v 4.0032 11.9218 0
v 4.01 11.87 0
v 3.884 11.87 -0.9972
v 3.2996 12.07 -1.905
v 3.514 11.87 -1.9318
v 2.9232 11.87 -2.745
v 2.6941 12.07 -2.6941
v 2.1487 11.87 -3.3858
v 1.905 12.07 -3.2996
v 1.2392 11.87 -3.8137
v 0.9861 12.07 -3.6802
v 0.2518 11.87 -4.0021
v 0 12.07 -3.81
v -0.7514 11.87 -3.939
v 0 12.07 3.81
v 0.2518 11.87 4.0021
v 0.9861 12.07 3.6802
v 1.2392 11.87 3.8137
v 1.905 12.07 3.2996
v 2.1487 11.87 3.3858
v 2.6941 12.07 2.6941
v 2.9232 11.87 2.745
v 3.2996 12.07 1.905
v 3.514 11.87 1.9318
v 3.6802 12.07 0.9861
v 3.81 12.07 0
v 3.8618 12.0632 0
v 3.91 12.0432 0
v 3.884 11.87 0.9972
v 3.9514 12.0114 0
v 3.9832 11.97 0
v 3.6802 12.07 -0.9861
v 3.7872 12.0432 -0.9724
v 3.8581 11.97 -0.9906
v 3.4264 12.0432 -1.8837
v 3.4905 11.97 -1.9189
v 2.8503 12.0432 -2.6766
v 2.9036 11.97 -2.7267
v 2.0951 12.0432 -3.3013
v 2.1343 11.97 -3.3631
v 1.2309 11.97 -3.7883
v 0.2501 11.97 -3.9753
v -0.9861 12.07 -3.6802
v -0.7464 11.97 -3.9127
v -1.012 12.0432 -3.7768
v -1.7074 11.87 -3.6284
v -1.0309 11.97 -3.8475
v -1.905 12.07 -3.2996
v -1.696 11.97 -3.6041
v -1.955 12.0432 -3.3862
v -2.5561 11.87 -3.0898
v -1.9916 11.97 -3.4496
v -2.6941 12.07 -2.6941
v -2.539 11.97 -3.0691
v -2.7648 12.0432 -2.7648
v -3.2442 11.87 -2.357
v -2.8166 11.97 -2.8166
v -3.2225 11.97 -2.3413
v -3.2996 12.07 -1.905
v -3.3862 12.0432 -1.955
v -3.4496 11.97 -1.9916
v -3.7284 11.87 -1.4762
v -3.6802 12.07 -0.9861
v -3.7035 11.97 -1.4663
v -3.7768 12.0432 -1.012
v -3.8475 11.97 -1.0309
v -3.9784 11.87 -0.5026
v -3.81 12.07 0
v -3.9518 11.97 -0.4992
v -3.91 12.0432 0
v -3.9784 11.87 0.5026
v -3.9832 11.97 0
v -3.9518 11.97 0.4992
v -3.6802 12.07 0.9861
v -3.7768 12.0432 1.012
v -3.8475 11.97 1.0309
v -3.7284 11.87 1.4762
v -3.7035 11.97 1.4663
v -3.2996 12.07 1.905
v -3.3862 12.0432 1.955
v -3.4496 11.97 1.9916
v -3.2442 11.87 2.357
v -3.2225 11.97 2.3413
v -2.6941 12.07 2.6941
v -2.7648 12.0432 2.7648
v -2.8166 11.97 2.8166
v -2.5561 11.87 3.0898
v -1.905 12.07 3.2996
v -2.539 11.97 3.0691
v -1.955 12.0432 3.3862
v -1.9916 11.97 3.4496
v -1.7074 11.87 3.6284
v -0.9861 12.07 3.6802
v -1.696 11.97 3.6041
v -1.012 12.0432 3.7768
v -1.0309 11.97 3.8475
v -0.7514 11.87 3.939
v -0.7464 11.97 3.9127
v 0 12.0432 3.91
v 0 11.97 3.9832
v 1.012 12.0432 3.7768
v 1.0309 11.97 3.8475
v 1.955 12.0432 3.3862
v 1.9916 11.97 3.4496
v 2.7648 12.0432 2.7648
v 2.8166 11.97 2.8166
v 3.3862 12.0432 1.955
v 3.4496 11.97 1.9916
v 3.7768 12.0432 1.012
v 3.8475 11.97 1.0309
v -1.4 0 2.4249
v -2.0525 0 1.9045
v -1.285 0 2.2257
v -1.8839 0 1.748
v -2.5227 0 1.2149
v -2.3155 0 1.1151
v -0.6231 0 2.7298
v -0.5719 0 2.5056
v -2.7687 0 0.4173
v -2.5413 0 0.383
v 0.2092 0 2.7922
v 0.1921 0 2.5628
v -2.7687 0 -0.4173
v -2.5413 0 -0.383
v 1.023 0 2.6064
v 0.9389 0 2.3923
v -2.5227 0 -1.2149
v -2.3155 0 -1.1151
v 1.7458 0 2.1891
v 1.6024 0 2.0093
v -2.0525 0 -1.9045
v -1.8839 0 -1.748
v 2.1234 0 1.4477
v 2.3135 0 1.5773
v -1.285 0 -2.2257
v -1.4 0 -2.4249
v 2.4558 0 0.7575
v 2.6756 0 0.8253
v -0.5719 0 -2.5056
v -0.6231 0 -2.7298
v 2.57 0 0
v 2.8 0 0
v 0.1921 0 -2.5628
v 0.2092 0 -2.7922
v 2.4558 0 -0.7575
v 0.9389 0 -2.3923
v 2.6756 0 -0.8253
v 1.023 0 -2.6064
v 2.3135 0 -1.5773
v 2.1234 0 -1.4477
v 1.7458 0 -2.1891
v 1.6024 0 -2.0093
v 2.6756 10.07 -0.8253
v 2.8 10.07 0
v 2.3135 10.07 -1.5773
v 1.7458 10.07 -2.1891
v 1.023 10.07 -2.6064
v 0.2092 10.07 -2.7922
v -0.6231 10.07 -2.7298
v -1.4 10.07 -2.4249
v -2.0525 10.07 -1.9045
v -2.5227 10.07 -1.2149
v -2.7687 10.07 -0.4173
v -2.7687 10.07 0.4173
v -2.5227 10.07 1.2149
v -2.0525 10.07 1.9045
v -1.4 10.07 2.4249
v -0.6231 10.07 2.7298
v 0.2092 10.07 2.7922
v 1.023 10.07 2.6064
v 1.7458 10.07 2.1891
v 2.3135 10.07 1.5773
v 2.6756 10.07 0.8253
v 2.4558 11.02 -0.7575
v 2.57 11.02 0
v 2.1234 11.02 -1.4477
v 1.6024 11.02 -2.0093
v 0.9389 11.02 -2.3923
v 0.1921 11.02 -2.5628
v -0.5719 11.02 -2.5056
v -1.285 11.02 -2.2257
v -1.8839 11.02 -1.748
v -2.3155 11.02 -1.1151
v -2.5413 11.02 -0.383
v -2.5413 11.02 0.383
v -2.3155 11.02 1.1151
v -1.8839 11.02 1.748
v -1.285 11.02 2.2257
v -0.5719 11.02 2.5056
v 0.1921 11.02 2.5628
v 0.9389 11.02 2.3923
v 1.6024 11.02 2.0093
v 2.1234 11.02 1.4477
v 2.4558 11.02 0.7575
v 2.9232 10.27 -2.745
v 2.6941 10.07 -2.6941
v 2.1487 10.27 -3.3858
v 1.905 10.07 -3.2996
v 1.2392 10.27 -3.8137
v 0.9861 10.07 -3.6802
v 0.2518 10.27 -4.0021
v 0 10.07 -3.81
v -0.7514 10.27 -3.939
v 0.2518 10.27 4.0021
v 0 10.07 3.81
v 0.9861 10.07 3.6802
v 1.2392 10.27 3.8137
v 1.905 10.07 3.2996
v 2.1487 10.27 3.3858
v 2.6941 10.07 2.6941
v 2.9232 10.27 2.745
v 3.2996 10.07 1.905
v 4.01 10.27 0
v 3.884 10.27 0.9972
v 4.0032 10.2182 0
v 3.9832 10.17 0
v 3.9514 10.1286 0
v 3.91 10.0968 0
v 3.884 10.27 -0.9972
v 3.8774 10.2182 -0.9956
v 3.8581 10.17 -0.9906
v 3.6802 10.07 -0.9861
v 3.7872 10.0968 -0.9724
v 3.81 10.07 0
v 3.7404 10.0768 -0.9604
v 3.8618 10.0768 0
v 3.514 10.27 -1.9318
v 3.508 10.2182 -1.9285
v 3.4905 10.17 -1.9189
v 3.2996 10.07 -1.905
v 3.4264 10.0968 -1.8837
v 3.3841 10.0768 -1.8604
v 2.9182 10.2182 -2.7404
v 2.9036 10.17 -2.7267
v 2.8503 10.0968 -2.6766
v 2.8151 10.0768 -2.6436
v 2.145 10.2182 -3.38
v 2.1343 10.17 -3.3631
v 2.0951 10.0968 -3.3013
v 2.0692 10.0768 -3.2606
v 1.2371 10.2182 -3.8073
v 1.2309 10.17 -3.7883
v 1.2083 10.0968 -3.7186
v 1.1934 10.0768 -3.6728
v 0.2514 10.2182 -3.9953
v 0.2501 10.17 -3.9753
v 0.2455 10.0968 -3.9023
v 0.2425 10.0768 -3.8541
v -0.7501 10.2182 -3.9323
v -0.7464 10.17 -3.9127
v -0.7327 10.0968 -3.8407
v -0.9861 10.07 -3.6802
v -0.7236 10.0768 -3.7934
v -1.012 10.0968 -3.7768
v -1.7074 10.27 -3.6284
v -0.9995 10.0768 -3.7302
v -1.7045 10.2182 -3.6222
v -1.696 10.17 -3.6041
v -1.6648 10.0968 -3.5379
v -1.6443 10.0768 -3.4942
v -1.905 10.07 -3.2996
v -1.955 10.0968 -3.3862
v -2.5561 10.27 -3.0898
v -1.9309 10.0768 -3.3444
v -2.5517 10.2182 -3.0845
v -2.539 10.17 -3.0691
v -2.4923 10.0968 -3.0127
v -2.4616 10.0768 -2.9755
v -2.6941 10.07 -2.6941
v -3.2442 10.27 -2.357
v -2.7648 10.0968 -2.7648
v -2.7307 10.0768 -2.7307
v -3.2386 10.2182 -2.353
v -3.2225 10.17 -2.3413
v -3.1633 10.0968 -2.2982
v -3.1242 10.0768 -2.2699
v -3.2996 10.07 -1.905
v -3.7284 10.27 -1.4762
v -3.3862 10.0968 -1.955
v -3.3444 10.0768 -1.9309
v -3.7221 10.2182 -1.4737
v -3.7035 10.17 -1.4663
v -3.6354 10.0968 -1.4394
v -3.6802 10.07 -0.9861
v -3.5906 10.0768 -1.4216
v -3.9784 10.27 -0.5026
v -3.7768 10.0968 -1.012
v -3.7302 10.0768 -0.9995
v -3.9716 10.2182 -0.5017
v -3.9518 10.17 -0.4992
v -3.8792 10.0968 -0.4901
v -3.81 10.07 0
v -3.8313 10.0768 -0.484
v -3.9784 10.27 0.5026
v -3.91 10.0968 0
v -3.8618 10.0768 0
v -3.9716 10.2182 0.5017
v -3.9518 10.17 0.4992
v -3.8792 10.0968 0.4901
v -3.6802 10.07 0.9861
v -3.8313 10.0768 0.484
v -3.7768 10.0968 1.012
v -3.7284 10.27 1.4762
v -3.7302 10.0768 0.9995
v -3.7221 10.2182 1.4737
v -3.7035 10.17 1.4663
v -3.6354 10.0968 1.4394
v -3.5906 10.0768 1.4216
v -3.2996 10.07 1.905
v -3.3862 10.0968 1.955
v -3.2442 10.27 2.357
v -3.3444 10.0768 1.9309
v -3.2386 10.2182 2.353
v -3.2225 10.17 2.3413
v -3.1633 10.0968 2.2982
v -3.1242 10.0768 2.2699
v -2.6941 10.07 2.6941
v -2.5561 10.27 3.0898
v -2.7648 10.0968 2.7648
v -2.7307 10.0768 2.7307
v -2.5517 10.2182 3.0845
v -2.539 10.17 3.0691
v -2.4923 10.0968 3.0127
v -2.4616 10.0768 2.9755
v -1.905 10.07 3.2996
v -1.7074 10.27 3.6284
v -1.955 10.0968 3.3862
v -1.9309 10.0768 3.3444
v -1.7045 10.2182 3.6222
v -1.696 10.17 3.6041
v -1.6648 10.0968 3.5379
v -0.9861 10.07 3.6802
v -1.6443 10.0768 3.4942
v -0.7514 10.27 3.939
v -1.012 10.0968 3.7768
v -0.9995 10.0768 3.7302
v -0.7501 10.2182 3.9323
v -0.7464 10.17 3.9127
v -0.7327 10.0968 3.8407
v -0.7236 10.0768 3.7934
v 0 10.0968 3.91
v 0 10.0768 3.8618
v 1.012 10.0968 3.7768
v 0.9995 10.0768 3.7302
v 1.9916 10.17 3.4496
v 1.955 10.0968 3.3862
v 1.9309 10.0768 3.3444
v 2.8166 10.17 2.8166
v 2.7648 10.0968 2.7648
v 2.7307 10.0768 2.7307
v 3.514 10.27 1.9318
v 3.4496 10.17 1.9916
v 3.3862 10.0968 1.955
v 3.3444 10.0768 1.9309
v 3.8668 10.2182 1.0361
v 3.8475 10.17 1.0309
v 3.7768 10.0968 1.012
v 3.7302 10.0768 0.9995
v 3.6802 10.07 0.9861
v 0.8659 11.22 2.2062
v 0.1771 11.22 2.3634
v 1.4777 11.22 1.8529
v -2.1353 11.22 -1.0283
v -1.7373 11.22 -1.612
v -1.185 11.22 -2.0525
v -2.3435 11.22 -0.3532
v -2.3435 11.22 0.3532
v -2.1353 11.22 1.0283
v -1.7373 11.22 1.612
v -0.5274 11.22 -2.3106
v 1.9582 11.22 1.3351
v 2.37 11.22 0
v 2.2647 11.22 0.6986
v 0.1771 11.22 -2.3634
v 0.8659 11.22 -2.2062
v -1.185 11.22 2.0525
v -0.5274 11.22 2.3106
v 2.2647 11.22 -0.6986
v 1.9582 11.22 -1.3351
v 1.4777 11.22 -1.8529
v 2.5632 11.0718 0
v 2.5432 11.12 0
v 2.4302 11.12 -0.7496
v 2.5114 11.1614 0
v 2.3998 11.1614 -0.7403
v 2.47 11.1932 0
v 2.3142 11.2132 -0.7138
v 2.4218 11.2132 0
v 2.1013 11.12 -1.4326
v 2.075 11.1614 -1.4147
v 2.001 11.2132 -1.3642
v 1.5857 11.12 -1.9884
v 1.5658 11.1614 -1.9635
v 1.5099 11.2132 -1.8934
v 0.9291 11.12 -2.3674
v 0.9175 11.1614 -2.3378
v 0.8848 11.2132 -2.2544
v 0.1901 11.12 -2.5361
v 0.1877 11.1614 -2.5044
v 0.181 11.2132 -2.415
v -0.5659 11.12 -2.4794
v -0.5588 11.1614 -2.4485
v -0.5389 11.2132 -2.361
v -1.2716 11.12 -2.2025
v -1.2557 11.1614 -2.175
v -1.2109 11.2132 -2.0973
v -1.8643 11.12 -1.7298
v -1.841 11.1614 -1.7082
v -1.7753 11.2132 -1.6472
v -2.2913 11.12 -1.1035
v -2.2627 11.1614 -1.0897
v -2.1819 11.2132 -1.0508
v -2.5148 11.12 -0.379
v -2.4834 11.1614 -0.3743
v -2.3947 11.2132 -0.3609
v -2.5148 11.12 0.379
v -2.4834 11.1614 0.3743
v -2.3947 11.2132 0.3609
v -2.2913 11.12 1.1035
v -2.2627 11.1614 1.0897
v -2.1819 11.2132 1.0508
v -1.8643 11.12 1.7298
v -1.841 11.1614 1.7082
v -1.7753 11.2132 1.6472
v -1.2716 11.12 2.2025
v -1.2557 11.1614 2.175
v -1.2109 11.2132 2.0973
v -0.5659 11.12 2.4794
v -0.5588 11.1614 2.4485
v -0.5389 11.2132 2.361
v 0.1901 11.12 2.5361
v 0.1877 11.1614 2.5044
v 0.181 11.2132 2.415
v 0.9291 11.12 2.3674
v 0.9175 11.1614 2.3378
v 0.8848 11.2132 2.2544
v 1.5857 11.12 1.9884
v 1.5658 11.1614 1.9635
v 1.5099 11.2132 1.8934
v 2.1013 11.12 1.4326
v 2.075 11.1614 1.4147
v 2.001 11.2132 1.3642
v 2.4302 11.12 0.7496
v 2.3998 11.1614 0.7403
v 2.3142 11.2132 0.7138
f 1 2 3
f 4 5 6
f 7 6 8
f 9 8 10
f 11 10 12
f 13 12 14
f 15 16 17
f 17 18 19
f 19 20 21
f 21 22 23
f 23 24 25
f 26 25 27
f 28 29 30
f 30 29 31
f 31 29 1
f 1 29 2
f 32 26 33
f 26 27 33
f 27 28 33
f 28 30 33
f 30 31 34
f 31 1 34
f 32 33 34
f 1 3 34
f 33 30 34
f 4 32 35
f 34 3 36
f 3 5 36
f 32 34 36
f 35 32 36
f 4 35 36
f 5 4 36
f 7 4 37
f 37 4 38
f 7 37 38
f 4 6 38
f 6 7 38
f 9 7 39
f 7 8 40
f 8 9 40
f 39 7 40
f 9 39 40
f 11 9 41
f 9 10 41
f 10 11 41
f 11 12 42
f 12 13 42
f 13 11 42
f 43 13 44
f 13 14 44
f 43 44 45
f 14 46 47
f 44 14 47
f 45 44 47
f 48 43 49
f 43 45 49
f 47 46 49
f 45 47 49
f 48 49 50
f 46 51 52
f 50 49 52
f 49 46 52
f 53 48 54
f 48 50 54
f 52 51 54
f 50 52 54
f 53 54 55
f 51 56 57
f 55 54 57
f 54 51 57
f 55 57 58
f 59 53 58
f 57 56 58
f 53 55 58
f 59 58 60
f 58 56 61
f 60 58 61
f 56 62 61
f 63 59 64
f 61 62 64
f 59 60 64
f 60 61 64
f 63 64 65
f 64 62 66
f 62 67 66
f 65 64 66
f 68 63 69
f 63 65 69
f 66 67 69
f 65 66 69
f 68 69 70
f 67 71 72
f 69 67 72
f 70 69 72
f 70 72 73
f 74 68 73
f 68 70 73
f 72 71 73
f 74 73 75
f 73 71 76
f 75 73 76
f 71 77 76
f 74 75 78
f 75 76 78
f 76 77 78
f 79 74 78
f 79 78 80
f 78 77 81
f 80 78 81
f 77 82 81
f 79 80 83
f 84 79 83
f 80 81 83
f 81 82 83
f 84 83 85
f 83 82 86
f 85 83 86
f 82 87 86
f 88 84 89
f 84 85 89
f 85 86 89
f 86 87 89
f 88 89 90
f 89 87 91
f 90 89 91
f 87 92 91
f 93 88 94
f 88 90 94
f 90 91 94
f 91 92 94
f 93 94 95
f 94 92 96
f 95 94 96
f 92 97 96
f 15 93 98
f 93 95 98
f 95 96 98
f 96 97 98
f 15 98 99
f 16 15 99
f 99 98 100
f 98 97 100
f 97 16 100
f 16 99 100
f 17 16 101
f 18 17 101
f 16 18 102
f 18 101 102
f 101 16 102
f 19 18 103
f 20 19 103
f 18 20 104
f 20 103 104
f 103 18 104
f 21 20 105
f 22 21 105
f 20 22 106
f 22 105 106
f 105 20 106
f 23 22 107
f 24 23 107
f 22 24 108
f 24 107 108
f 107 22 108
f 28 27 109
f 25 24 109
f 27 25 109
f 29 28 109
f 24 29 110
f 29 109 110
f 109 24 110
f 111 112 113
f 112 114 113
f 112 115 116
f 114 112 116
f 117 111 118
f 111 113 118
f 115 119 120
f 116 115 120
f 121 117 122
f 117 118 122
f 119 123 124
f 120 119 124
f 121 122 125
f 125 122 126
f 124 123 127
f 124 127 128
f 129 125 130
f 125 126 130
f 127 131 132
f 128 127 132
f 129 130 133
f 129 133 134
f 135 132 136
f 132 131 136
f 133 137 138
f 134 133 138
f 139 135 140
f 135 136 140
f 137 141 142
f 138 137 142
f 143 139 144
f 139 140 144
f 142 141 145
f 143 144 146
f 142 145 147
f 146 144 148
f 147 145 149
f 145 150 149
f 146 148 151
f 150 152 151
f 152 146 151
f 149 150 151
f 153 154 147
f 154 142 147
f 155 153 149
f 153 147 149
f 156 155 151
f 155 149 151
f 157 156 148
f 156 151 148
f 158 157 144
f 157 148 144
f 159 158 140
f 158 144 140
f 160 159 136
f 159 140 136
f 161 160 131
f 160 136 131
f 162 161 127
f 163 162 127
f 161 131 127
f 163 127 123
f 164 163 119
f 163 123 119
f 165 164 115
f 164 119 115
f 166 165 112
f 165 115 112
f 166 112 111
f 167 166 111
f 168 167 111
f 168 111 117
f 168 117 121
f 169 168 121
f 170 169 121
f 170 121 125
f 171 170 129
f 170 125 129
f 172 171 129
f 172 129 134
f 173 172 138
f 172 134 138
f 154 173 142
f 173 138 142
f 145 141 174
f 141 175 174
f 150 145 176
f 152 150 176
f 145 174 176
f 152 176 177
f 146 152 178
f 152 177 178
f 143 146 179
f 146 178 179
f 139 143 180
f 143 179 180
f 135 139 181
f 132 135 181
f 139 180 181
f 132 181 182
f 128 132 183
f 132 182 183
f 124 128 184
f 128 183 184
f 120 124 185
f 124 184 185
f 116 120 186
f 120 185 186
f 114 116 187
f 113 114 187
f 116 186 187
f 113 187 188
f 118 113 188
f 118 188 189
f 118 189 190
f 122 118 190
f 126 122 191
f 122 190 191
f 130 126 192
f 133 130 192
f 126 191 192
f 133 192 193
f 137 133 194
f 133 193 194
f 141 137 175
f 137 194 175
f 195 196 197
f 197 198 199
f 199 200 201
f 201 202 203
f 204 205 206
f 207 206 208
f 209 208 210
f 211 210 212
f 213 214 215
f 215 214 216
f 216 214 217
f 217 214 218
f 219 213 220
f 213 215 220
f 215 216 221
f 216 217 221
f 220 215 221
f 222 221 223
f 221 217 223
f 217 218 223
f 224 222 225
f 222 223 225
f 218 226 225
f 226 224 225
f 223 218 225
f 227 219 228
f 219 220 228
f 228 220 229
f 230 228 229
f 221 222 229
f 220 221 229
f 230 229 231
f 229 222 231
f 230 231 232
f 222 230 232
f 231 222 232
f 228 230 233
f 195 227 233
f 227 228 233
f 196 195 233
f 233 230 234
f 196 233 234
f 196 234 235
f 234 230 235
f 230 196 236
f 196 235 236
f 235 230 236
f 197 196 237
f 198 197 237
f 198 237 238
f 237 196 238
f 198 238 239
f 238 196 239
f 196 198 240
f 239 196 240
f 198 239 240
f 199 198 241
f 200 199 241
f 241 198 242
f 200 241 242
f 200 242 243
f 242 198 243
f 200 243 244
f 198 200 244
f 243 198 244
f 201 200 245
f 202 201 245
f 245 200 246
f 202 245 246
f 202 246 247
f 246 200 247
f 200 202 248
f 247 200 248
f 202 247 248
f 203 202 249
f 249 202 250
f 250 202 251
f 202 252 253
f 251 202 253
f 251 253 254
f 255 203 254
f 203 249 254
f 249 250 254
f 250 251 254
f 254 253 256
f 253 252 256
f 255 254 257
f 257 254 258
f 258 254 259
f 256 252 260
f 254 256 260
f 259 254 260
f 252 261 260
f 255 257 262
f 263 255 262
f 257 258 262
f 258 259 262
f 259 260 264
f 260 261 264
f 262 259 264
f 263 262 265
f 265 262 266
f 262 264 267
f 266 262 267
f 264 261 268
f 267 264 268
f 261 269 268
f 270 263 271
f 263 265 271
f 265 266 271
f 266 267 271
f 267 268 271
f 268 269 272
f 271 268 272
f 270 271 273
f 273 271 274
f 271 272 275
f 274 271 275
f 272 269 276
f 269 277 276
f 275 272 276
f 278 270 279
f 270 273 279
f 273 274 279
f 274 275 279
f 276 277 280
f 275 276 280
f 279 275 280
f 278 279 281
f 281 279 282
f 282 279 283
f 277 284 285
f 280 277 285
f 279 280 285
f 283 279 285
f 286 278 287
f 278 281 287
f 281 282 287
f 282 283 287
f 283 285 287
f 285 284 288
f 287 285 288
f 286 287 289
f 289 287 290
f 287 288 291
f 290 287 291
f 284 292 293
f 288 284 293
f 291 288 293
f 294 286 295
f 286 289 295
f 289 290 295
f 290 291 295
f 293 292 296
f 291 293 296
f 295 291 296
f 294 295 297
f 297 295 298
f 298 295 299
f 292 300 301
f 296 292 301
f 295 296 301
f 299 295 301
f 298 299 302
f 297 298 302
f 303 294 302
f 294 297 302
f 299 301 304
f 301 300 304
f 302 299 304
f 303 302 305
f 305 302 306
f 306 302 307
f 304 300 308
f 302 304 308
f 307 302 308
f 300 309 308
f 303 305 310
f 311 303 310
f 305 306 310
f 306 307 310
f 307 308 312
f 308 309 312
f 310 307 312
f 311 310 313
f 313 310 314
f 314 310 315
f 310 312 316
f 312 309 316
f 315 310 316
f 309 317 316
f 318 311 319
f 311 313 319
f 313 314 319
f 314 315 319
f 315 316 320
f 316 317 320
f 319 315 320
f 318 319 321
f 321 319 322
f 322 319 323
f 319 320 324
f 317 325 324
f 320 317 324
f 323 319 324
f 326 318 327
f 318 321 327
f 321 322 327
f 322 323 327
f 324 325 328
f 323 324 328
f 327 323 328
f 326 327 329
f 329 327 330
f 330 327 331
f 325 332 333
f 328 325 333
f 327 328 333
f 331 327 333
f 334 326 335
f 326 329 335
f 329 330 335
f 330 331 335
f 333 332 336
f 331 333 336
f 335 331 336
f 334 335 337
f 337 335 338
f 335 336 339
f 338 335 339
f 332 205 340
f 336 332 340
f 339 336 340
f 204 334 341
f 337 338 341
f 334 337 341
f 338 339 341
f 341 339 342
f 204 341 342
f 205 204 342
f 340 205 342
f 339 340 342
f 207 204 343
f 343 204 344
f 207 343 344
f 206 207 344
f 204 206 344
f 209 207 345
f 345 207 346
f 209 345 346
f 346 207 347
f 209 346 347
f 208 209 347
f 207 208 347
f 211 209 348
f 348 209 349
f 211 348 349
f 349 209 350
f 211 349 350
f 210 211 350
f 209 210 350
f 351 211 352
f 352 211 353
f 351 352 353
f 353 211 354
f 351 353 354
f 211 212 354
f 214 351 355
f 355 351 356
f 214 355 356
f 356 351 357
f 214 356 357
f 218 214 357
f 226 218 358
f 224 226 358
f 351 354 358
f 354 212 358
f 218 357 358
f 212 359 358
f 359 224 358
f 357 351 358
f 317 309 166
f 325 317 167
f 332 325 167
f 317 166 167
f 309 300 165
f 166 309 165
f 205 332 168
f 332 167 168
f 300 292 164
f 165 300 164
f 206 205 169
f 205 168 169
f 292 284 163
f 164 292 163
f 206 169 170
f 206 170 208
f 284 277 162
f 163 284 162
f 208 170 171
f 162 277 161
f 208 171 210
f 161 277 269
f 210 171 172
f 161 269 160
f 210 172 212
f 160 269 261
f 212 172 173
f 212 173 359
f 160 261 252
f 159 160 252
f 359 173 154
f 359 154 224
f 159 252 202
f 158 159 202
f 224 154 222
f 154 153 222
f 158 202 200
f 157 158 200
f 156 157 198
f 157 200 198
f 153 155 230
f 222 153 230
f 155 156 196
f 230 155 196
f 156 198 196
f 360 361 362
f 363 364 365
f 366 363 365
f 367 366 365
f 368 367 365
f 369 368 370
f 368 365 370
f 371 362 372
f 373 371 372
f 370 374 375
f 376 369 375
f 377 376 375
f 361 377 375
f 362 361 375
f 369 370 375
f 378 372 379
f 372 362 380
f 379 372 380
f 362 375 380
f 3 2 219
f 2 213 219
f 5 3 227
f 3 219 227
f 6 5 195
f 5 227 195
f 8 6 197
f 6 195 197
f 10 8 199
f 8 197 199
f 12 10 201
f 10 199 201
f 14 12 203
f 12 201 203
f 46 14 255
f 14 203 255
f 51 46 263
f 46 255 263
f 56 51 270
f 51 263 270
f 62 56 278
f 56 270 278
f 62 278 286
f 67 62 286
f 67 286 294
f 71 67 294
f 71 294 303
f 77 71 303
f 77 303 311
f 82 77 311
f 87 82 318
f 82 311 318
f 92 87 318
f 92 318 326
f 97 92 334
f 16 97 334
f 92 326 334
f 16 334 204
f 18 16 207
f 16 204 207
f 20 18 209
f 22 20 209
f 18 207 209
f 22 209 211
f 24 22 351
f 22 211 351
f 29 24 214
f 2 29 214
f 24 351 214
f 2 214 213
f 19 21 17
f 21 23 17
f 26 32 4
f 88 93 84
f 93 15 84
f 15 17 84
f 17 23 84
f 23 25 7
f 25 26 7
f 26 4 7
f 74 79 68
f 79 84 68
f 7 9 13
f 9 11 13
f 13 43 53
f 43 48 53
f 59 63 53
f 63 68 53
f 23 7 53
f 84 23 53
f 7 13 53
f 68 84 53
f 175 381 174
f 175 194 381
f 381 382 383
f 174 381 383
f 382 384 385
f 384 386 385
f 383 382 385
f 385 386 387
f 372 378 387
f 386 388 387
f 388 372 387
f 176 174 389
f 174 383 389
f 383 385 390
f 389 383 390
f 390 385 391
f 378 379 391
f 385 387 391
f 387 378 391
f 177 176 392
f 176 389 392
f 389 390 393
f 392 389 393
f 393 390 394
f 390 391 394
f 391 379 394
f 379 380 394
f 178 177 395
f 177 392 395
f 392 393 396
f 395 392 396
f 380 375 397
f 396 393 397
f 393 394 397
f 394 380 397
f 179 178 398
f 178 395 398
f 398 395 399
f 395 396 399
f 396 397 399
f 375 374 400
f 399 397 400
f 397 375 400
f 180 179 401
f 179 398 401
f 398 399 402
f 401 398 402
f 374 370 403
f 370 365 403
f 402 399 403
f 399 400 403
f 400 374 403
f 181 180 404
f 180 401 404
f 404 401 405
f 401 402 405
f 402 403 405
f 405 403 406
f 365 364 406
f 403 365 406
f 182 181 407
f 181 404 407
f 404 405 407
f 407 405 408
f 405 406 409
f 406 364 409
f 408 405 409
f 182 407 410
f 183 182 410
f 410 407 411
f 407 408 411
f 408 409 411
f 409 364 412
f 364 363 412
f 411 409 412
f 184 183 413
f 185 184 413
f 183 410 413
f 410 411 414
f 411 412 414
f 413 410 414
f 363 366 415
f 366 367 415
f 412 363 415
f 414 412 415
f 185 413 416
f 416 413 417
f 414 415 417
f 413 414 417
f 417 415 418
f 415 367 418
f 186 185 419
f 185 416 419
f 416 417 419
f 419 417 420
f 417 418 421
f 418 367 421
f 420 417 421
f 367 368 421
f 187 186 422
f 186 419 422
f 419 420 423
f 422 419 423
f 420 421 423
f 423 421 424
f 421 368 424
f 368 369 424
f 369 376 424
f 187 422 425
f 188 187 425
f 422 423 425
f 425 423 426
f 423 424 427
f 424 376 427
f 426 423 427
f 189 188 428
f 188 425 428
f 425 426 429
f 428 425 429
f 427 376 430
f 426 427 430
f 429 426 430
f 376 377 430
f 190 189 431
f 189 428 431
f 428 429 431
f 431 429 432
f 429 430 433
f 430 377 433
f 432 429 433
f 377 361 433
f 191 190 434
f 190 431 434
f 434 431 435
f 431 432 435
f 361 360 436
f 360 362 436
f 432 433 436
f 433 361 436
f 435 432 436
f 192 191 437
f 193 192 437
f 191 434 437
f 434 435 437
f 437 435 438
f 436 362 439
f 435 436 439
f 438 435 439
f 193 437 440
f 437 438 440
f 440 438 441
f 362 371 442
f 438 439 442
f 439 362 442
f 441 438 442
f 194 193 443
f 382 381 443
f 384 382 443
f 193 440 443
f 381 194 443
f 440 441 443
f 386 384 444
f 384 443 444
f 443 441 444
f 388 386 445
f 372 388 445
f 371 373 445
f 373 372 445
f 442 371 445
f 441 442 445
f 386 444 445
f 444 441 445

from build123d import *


with BuildPart() as part:
    # Esboço1 → Revolução1 (revolve)
    with BuildSketch(Plane.XY, mode=Mode.PRIVATE) as revolu_o1_sk:
        with BuildLine():
            Line((0, 12.07), (-3.81, 12.07))
            ThreePointArc((-3.81, 12.07), (-3.951421356, 12.011421356), (-4.01, 11.87))
            Line((-4.01, 11.87), (-4.01, 10.27))
            ThreePointArc((-4.01, 10.27), (-3.951421356, 10.128578644), (-3.81, 10.07))
            Line((-3.81, 10.07), (-2.8, 10.07))
            Line((-2.8, 10.07), (-2.8, 0))
            Line((-2.8, 0), (-2.57, 0))
            Line((-2.57, 0), (-2.57, 11.02))
            ThreePointArc((-2.57, 11.02), (-2.511421356, 11.161421356), (-2.37, 11.22))
            Line((-2.37, 11.22), (0, 11.22))
            Line((0, 11.22), (0, 12.07))
        make_face()
    revolve(revolu_o1_sk.sketch.rotate(Axis((0, 0, 0), (0, 1, 0)), 180), axis=Axis((0, 0, 0), (0, 1, 0)))


solid = part.part
